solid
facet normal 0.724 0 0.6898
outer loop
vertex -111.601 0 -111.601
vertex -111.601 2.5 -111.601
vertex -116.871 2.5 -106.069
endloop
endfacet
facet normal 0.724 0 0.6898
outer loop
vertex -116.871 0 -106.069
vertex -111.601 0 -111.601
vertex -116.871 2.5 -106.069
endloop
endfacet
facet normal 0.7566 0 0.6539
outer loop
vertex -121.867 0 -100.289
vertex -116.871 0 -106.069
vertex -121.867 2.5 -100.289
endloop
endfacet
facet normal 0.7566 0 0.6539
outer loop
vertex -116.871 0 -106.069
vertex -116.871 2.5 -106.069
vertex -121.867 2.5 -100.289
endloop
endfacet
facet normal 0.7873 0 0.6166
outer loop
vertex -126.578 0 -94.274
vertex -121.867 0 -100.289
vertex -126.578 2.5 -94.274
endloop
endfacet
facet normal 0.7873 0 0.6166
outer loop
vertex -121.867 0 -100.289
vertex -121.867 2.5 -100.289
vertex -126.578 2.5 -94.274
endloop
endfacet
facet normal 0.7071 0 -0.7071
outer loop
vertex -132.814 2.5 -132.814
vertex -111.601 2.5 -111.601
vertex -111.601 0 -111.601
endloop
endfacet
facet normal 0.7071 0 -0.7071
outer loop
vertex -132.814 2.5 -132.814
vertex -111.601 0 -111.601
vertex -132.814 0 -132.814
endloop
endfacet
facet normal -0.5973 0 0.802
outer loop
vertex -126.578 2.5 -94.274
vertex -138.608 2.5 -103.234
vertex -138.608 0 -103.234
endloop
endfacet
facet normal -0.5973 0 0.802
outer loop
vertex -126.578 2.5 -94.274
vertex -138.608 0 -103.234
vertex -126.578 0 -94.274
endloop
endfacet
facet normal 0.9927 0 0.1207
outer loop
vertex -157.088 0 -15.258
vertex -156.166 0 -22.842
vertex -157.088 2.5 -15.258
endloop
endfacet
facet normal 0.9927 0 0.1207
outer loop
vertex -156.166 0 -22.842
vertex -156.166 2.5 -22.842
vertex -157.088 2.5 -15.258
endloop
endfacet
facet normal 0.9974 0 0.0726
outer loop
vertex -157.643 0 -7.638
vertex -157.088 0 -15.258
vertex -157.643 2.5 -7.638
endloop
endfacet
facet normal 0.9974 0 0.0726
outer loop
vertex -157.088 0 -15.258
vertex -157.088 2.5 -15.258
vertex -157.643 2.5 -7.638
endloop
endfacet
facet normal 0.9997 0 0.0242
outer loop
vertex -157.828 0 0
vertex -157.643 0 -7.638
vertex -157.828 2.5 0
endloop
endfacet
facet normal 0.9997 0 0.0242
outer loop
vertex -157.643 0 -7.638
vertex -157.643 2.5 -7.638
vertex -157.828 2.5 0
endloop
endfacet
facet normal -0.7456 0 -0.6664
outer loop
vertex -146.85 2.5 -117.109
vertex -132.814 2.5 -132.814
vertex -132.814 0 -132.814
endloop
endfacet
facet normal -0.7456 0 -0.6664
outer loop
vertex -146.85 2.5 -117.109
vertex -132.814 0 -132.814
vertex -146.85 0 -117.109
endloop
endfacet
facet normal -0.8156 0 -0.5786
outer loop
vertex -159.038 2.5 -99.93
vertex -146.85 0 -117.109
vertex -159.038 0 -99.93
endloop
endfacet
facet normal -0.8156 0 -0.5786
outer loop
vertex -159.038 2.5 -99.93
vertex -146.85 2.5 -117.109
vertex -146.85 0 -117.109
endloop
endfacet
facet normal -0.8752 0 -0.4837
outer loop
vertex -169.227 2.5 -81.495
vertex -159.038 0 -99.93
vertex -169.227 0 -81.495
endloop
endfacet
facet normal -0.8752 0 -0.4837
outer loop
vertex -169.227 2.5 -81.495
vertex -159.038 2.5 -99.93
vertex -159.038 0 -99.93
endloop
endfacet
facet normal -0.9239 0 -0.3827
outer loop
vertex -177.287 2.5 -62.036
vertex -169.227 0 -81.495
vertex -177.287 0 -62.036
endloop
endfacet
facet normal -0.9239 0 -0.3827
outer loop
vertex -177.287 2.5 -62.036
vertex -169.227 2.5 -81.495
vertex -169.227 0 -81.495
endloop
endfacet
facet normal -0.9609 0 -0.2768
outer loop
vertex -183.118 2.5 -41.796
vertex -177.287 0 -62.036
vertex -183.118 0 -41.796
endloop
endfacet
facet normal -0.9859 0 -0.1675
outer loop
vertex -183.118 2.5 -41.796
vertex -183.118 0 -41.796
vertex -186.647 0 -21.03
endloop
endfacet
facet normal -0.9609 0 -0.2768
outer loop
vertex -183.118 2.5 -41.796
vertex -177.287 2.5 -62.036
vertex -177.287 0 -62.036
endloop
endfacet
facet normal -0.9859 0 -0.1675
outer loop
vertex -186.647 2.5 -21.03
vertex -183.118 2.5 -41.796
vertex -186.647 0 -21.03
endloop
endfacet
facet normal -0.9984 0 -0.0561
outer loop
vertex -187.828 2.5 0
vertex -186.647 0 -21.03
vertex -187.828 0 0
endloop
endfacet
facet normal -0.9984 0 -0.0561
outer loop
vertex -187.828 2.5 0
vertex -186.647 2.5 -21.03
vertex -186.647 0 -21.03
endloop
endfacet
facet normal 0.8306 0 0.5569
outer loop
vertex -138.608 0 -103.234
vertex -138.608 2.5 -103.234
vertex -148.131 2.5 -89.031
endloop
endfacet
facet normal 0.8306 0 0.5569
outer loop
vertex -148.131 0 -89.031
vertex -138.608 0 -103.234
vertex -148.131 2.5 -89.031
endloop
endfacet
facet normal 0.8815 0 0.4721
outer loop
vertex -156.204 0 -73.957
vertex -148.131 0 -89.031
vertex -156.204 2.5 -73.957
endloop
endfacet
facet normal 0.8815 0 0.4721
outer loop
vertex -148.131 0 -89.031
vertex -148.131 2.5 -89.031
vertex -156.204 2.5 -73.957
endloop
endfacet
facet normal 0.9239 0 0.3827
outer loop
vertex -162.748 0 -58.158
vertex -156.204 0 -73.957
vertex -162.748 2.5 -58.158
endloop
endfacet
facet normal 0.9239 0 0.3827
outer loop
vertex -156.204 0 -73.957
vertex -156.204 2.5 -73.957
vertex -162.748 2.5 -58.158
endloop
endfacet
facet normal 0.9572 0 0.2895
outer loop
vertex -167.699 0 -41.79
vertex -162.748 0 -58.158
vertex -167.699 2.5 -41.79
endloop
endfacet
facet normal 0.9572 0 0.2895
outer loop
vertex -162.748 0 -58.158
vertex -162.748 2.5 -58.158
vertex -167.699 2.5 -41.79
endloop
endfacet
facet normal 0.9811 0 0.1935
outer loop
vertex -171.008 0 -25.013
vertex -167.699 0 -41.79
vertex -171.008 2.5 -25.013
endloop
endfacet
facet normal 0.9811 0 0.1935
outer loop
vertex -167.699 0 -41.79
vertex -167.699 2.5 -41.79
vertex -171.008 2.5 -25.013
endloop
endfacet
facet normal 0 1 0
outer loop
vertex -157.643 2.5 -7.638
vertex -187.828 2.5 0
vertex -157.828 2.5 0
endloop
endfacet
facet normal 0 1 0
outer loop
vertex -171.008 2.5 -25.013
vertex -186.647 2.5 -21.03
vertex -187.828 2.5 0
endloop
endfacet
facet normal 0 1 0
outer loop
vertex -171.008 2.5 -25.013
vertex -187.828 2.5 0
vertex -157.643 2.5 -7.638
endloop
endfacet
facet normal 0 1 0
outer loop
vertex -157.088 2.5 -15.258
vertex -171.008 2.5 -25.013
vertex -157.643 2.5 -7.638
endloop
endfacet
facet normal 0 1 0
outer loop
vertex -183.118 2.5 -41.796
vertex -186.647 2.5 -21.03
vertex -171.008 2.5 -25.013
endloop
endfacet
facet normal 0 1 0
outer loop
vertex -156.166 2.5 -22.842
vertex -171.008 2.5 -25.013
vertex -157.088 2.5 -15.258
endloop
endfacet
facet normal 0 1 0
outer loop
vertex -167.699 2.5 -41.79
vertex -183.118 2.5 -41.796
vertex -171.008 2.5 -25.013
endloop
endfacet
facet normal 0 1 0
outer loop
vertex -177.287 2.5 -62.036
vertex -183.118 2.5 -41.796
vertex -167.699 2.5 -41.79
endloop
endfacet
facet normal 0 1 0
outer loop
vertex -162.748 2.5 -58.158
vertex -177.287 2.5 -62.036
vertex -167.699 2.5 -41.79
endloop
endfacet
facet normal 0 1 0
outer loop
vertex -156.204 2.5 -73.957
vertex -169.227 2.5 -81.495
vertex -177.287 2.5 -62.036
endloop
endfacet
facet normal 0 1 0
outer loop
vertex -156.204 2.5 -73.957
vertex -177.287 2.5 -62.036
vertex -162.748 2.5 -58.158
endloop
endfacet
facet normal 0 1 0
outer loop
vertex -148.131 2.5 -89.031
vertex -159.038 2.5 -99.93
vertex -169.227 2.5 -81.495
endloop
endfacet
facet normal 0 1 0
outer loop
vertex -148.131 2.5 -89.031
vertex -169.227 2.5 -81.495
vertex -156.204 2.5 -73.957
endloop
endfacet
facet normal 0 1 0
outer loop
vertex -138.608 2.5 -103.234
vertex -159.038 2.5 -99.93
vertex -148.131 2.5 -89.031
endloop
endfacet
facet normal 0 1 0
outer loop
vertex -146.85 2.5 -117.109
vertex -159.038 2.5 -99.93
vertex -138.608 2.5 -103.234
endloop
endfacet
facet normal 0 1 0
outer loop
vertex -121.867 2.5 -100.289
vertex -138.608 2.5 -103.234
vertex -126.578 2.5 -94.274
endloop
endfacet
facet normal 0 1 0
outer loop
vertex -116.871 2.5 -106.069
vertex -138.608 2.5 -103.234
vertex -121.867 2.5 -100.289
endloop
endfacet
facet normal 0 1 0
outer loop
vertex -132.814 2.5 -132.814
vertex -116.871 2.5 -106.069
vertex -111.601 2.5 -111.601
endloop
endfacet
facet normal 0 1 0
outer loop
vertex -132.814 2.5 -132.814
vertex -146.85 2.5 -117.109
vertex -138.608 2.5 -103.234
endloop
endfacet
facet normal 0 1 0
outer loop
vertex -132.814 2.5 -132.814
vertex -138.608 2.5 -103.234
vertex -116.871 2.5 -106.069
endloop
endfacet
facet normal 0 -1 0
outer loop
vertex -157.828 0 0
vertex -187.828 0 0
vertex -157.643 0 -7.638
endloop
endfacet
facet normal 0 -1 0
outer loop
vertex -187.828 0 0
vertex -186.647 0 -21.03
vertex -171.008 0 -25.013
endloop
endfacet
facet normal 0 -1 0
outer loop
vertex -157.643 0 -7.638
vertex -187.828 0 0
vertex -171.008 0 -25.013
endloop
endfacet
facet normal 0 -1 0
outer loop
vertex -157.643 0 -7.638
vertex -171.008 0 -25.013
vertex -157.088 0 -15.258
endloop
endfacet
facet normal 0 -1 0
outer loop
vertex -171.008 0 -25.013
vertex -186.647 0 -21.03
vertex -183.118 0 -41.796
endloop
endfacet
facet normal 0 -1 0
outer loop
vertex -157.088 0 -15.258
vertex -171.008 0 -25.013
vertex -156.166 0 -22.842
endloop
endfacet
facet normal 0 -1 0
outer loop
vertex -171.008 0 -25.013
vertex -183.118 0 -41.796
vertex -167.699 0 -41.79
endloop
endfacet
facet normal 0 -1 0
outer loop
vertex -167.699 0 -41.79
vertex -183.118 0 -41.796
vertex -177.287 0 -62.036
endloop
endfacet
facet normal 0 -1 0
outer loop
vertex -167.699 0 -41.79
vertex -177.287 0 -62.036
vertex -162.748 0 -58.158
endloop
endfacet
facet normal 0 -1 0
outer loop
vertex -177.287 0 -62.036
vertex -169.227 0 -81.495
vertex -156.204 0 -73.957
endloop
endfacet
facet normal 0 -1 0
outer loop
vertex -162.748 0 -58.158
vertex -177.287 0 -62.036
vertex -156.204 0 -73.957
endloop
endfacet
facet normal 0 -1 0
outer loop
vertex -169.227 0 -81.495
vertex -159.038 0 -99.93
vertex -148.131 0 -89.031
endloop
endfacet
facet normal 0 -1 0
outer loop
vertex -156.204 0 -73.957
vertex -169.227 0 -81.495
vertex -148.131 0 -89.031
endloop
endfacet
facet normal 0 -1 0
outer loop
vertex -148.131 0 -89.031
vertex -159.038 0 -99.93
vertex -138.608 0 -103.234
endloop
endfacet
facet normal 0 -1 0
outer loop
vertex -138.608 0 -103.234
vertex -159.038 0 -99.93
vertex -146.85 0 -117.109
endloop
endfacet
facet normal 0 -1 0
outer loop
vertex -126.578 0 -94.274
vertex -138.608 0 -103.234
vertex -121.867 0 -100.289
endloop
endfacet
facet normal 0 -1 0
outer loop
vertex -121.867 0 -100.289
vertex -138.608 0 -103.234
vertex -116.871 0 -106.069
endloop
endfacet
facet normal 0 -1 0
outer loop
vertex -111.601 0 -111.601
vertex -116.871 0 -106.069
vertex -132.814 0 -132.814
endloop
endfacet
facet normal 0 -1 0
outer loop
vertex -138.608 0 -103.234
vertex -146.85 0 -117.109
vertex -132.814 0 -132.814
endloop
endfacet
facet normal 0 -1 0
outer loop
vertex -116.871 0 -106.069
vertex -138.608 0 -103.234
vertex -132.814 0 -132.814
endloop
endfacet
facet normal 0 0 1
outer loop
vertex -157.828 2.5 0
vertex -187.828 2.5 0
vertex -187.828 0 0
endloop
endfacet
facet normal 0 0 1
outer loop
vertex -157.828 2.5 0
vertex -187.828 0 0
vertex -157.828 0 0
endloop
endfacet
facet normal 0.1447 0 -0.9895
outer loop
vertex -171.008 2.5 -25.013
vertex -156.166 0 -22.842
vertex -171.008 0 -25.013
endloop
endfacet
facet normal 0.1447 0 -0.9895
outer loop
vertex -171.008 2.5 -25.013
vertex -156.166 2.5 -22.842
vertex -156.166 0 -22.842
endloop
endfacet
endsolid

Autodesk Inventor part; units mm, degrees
ref_plane "YZ Plane" through (0, 0, 0) normal (1, 0, 0) x (0, 1, 0)
ref_plane "XZ Plane" through (0, 0, 0) normal (0, 1, 0) x (-1, 0, 0)
ref_plane "XY Plane" through (0, 0, 0) normal (0, 0, 1) x (1, 0, 0)
sketch "スケッチ1" plane through (0, 0, 0) normal (0, 1, 0) x (-1, 0, 0)
  circle A0 centre (0, 0) radius 178.1675
  circle A1 centre (0, 0) radius 157.8276
  line L0 (168.1877, 0) -> (166.7488, -21.9529)
  line L1 (168.1877, 0) -> (130.1721, 2.4917) construction
  line L2 (249.4344, 0) -> (-249.4344, 0) projected
  line L3 (166.7488, -21.9529) -> (156.7702, -21.2989)
  line L4 (156.7702, -21.2989) -> (158.2091, 0.654) construction
  line L5 (158.2091, 0.654) -> (168.1877, 0)
  line L6 (157.4896, -10.3224) -> (0, 0)
  line L7 (166.7488, -21.9529) -> (162.4568, -43.5302)
  line L8 (162.4568, -43.5302) -> (152.649, -41.5793) construction
  line L9 (152.649, -41.5793) -> (156.9409, -20.002) construction
  line L10 (156.9409, -20.002) -> (166.7488, -21.9529) construction
  line L11 (162.4568, -43.5302) -> (155.3851, -64.3626)
  line L12 (155.3851, -64.3626) -> (145.9158, -61.1482) construction
  line L13 (145.9158, -61.1482) -> (152.9875, -40.3158) construction
  line L14 (152.9875, -40.3158) -> (162.4568, -43.5302) construction
  line L15 (155.3851, -64.3626) -> (145.6548, -84.0938)
  line L16 (145.6548, -84.0938) -> (136.6861, -79.6709) construction
  line L17 (136.6861, -79.6709) -> (146.4164, -59.9397) construction
  line L18 (146.4164, -59.9397) -> (155.3851, -64.3626) construction
  line L19 (0, 0) -> (111.6009, -111.6009)
  line L20 (145.6548, -84.0938) -> (137.3401, -78.5381) construction
  line L21 (137.3401, -78.5381) -> (125.1176, -96.8305) construction
  line L22 (125.1176, -96.8305) -> (133.4323, -102.3862) construction
  line L23 (133.4323, -102.3862) -> (145.6548, -84.0938)
  line L24 (133.4323, -102.3862) -> (125.9139, -95.7927) construction
  line L25 (125.9139, -95.7927) -> (111.4082, -112.3332) construction
  line L26 (111.4082, -112.3332) -> (118.9266, -118.9266)
  line L27 (118.9266, -118.9266) -> (133.4323, -102.3862)
  line L28 (111.6009, -111.6009) -> (118.9266, -118.9266)
  line L29 (166.7488, -21.9529) -> (176.7274, -22.6069) construction
  line L30 (118.9266, -118.9266) -> (125.9834, -125.9834)
  point P0 (154.795, -30.7906)
  point P1 (149.4517, -50.732)
  point P2 (141.5512, -69.8053)
  point P3 (131.2288, -87.6843)
  point P4 (118.661, -104.0629)
  point P5 (157.8276, 0)
  point P6 (178.1675, 0)
  dimension "d0" = 22
  dimension "d1" = 10
  dimension "d2" = 45
  dimension "d4" = 315.6551
extrude "押し出し1" add sketch "スケッチ1" along normal blind 2.5 contours L30 L27 L23 L15 L11 L7 L0 L2 A0 | L28 A1 L2 L0 L7 L11 L15 L23 L27
sketch "スケッチ2" plane through (0, 2.5, 0) normal (0, 1, 0) x (1, 0, 0)
  circle A0 centre (0, 0) radius 277.8276
  line L0 (-168.1877, 0) -> (-166.7488, 21.9529) projected
  line L1 (-166.7488, 21.9529) -> (-162.4568, 43.5302) projected
  line L2 (-162.4568, 43.5302) -> (-155.3851, 64.3626) projected
  line L3 (-155.3851, 64.3626) -> (-145.6548, 84.0938) projected
  line L4 (-133.4323, 102.3862) -> (-145.6548, 84.0938) projected
  line L5 (-118.9266, 118.9266) -> (-133.4323, 102.3862) projected
  line L6 (-167.4682, 10.9764) -> (-166.0294, 32.9293)
  line L7 (-166.0294, 32.9293) -> (-275.7938, 40.1237)
  line L8 (-275.7938, 40.1237) -> (-277.2327, 18.1708)
  line L9 (-277.2327, 18.1708) -> (-167.4682, 10.9764)
  line L10 (-164.6028, 32.7415) -> (-160.3108, 54.3188)
  line L11 (-160.3108, 54.3188) -> (-268.1972, 75.7787)
  line L12 (-268.1972, 75.7787) -> (-272.4892, 54.2015)
  line L13 (-272.4892, 54.2015) -> (-164.6028, 32.7415)
  circle A1 centre (-166.7488, 21.9529) radius 11
  circle A2 centre (-162.4568, 43.5302) radius 11
  line L14 (-158.921, 53.9464) -> (-151.8493, 74.7789)
  line L15 (-151.8493, 74.7789) -> (-256.0116, 110.1372)
  line L16 (-256.0116, 110.1372) -> (-263.0833, 89.3047)
  line L17 (-263.0833, 89.3047) -> (-158.921, 53.9464)
  circle A3 centre (-155.3851, 64.3626) radius 11
  arc A4 (-275.7591, 62.4834) -> (-281.3553, 41.7349) centre (-166.7488, 21.9529) ccw
  line L18 (-178.1663, 0.654) -> (-158.2091, -0.654)
  line L19 (-158.2091, -0.654) -> (-156.7702, 21.2989)
  line L20 (-156.7702, 21.2989) -> (-176.7274, 22.6069)
  line L21 (-176.7274, 22.6069) -> (-178.1663, 0.654)
  line L22 (-177.4468, 11.6305) -> (-275.7938, 40.1237)
  line L23 (-176.7274, 22.6069) -> (-176.008, 33.5834)
  line L24 (-176.008, 33.5834) -> (-275.7591, 62.4834)
  line L25 (-275.7938, 40.1237) -> (-281.3553, 41.7349)
  circle A5 centre (0, 0) radius 137.8276
  line L26 (0, 0) -> (-196.4538, 196.4538)
  line L27 (-111.6009, 111.6009) -> (-125.9834, 125.9834) projected
  line L28 (-411.1762, 0) -> (411.1762, 0) projected
  circle A6 centre (0, 0) radius 257.8276 construction
  arc A7 (-111.6009, 111.6009) -> (-157.8276, 0) centre (0, 0) ccw projected
  point P0 (-158.1662, 0)
  point P1 (-137.8276, 0)
  point P2 (-97.4588, 97.4588)
  point P3 (-277.8276, 0)
  dimension "d7" = 22
  dimension "d10" = 20
  dimension "d11" = 100
  dimension "d12" = 20
  dimension "d14" = 20
  dimension "d17" = 100
extrude "押し出し2" add sketch "スケッチ2" against normal blind 2.5 contours L26 L5 L4 L3 A3 L15 A0 | A0 L9 L21 L18 L28 | L15 A3 L17 A0 | A0 L22 L9 | L18 L21 L9 L0 | L0 A1 L19 L28 | A5 L28 A7 A1 A2 A3 L26 | L17 A2 L11 A0 | A3 L3 L14 | L14 L2 A3 | L26 A7 A3 L3 L4 L5 | A0 L7 L23 A1 L21 L22 | L21 A1 L9 | A1 L21 L20 L0 | L0 L20 L19 A1 | L19 A7 L28 | L11 A2 L13 L24 A0 | A2 A7 L1 L2 | L2 L10 A2 | A3 A7 A2 | L2 L3 A3 A7 | A0 L13 L24 L7 | A1 L23 L21 | L6 A1 L1 | L20 L23 A1 L6 | L1 A1 A7 L19 L20 | A1 A7 L19 | A3 A7 | L24 L13 A0 | L10 L1 A2 | A2 A7 | L24 L13 A1 L7 | L7 A1 L23 | A2 A7 A1 | A7 A1
sketch "スケッチ4" plane through (0, 2.5, 0) normal (0, 1, 0) x (1, 0, 0)
  circle A0 centre (0, 0) radius 187.8276
  arc A1 (-97.4588, 97.4588) -> (-137.8276, 0) centre (0, 0) ccw projected
  line L0 (-137.5954, 7.9966) -> (-137.8276, 0)
  arc A2 (-196.4538, 196.4538) -> (-277.8276, 0) centre (0, 0) ccw projected
  line L1 (-97.4588, 97.4588) -> (-196.4538, 196.4538) projected
  circle A3 centre (0, 0) radius 157.8276
  circle A4 centre (0, 0) radius 172.8276
  line L2 (-97.4588, 97.4588) -> (-196.4538, 196.4538) projected
  arc A5 (-196.4538, 196.4538) -> (-277.8276, 0) centre (0, 0) ccw projected
  line L3 (-277.8276, 0) -> (-137.8276, 0) projected
  arc A6 (-97.4588, 97.4588) -> (-137.8276, 0) centre (0, 0) ccw projected
  point P0 (-277.3596, 16.1193)
  point P1 (-111.6009, 111.6009)
  point P2 (-157.8276, 0)
  point P3 (-187.8276, 0)
  point P4 (-132.8141, 132.8141)
  point P5 (-277.8276, 0)
  point P6 (-172.8276, 0)
  point P7 (-122.2075, 122.2075)
  dimension "d23" = 50
  dimension "d29" = 20
  dimension "d30" = 15
extrude "押し出し4" cut sketch "スケッチ4" against normal through all contours A0 L3 A4 L1 | A0 L3 A2 L1 | A4 L3 A3 L1 | L1 A3 L3 A4 | A3 L3 L0 A1 L1 | L1 A1 L3 A3 picked at (-124.5192, 133.5739)
sketch "スケッチ5" plane through (0, 2.5, 0) normal (0, 1, 0) x (1, 0, 0)
  line L0 (-136.3765, 19.9473) -> (-185.8501, 27.1836) projected
  line L1 (-277.8276, 0) -> (-137.8276, 0) projected
  line L2 (-136.3765, 19.9473) -> (-185.8501, 27.1836) projected
  arc A0 (-185.8501, 27.1836) -> (-186.1918, 24.735) centre (0, 0) ccw projected
  arc A1 (-201.9314, 11.7356) -> (-186.1918, 24.735) centre (-201.0611, 26.7104) ccw projected
  line L3 (-201.9314, 11.7356) -> (-277.3596, 16.1193) projected
  arc A2 (-277.3596, 16.1193) -> (-277.8276, 0) centre (0, 0) ccw projected
  line L4 (-277.8276, 0) -> (-137.8276, 0) projected
  arc A3 (-136.3765, 19.9473) -> (-137.8276, 0) centre (0, 0) ccw projected
  line L5 (-150.6376, 112.1941) -> (-110.5376, 82.3279) projected
  arc A4 (-97.4588, 97.4588) -> (-110.5376, 82.3279) centre (0, 0) ccw projected
  line L6 (-97.4588, 97.4588) -> (-196.4538, 196.4538) projected
  arc A5 (-196.4538, 196.4538) -> (-207.5209, 184.7248) centre (0, 0) ccw projected
  line L7 (-207.5209, 184.7248) -> (-151.0854, 134.4887) projected
  arc A6 (-149.1478, 114.1672) -> (-151.0854, 134.4887) centre (-161.0588, 123.2846) ccw projected
  arc A7 (-149.1478, 114.1672) -> (-150.6376, 112.1941) centre (0, 0) ccw projected
  arc A8 (-111.6009, 111.6009) -> (-157.8276, 0) centre (0, 0) ccw projected
  arc A9 (-122.2075, 122.2075) -> (-172.8276, 0) centre (0, 0) ccw projected
  point P0 (-171.008, 25.0127)
  point P1 (-156.1659, 22.8418)
  point P2 (-138.6076, 103.2343)
  point P3 (-126.5776, 94.2744)
extrude "押し出し5" add sketch "スケッチ5" against normal up to surface (2.5 mm away) contours A8 L1 A9 L0 | L5 A9 L6 A8
properties part number "belt_rail" material "木材 (カエデ材)"
